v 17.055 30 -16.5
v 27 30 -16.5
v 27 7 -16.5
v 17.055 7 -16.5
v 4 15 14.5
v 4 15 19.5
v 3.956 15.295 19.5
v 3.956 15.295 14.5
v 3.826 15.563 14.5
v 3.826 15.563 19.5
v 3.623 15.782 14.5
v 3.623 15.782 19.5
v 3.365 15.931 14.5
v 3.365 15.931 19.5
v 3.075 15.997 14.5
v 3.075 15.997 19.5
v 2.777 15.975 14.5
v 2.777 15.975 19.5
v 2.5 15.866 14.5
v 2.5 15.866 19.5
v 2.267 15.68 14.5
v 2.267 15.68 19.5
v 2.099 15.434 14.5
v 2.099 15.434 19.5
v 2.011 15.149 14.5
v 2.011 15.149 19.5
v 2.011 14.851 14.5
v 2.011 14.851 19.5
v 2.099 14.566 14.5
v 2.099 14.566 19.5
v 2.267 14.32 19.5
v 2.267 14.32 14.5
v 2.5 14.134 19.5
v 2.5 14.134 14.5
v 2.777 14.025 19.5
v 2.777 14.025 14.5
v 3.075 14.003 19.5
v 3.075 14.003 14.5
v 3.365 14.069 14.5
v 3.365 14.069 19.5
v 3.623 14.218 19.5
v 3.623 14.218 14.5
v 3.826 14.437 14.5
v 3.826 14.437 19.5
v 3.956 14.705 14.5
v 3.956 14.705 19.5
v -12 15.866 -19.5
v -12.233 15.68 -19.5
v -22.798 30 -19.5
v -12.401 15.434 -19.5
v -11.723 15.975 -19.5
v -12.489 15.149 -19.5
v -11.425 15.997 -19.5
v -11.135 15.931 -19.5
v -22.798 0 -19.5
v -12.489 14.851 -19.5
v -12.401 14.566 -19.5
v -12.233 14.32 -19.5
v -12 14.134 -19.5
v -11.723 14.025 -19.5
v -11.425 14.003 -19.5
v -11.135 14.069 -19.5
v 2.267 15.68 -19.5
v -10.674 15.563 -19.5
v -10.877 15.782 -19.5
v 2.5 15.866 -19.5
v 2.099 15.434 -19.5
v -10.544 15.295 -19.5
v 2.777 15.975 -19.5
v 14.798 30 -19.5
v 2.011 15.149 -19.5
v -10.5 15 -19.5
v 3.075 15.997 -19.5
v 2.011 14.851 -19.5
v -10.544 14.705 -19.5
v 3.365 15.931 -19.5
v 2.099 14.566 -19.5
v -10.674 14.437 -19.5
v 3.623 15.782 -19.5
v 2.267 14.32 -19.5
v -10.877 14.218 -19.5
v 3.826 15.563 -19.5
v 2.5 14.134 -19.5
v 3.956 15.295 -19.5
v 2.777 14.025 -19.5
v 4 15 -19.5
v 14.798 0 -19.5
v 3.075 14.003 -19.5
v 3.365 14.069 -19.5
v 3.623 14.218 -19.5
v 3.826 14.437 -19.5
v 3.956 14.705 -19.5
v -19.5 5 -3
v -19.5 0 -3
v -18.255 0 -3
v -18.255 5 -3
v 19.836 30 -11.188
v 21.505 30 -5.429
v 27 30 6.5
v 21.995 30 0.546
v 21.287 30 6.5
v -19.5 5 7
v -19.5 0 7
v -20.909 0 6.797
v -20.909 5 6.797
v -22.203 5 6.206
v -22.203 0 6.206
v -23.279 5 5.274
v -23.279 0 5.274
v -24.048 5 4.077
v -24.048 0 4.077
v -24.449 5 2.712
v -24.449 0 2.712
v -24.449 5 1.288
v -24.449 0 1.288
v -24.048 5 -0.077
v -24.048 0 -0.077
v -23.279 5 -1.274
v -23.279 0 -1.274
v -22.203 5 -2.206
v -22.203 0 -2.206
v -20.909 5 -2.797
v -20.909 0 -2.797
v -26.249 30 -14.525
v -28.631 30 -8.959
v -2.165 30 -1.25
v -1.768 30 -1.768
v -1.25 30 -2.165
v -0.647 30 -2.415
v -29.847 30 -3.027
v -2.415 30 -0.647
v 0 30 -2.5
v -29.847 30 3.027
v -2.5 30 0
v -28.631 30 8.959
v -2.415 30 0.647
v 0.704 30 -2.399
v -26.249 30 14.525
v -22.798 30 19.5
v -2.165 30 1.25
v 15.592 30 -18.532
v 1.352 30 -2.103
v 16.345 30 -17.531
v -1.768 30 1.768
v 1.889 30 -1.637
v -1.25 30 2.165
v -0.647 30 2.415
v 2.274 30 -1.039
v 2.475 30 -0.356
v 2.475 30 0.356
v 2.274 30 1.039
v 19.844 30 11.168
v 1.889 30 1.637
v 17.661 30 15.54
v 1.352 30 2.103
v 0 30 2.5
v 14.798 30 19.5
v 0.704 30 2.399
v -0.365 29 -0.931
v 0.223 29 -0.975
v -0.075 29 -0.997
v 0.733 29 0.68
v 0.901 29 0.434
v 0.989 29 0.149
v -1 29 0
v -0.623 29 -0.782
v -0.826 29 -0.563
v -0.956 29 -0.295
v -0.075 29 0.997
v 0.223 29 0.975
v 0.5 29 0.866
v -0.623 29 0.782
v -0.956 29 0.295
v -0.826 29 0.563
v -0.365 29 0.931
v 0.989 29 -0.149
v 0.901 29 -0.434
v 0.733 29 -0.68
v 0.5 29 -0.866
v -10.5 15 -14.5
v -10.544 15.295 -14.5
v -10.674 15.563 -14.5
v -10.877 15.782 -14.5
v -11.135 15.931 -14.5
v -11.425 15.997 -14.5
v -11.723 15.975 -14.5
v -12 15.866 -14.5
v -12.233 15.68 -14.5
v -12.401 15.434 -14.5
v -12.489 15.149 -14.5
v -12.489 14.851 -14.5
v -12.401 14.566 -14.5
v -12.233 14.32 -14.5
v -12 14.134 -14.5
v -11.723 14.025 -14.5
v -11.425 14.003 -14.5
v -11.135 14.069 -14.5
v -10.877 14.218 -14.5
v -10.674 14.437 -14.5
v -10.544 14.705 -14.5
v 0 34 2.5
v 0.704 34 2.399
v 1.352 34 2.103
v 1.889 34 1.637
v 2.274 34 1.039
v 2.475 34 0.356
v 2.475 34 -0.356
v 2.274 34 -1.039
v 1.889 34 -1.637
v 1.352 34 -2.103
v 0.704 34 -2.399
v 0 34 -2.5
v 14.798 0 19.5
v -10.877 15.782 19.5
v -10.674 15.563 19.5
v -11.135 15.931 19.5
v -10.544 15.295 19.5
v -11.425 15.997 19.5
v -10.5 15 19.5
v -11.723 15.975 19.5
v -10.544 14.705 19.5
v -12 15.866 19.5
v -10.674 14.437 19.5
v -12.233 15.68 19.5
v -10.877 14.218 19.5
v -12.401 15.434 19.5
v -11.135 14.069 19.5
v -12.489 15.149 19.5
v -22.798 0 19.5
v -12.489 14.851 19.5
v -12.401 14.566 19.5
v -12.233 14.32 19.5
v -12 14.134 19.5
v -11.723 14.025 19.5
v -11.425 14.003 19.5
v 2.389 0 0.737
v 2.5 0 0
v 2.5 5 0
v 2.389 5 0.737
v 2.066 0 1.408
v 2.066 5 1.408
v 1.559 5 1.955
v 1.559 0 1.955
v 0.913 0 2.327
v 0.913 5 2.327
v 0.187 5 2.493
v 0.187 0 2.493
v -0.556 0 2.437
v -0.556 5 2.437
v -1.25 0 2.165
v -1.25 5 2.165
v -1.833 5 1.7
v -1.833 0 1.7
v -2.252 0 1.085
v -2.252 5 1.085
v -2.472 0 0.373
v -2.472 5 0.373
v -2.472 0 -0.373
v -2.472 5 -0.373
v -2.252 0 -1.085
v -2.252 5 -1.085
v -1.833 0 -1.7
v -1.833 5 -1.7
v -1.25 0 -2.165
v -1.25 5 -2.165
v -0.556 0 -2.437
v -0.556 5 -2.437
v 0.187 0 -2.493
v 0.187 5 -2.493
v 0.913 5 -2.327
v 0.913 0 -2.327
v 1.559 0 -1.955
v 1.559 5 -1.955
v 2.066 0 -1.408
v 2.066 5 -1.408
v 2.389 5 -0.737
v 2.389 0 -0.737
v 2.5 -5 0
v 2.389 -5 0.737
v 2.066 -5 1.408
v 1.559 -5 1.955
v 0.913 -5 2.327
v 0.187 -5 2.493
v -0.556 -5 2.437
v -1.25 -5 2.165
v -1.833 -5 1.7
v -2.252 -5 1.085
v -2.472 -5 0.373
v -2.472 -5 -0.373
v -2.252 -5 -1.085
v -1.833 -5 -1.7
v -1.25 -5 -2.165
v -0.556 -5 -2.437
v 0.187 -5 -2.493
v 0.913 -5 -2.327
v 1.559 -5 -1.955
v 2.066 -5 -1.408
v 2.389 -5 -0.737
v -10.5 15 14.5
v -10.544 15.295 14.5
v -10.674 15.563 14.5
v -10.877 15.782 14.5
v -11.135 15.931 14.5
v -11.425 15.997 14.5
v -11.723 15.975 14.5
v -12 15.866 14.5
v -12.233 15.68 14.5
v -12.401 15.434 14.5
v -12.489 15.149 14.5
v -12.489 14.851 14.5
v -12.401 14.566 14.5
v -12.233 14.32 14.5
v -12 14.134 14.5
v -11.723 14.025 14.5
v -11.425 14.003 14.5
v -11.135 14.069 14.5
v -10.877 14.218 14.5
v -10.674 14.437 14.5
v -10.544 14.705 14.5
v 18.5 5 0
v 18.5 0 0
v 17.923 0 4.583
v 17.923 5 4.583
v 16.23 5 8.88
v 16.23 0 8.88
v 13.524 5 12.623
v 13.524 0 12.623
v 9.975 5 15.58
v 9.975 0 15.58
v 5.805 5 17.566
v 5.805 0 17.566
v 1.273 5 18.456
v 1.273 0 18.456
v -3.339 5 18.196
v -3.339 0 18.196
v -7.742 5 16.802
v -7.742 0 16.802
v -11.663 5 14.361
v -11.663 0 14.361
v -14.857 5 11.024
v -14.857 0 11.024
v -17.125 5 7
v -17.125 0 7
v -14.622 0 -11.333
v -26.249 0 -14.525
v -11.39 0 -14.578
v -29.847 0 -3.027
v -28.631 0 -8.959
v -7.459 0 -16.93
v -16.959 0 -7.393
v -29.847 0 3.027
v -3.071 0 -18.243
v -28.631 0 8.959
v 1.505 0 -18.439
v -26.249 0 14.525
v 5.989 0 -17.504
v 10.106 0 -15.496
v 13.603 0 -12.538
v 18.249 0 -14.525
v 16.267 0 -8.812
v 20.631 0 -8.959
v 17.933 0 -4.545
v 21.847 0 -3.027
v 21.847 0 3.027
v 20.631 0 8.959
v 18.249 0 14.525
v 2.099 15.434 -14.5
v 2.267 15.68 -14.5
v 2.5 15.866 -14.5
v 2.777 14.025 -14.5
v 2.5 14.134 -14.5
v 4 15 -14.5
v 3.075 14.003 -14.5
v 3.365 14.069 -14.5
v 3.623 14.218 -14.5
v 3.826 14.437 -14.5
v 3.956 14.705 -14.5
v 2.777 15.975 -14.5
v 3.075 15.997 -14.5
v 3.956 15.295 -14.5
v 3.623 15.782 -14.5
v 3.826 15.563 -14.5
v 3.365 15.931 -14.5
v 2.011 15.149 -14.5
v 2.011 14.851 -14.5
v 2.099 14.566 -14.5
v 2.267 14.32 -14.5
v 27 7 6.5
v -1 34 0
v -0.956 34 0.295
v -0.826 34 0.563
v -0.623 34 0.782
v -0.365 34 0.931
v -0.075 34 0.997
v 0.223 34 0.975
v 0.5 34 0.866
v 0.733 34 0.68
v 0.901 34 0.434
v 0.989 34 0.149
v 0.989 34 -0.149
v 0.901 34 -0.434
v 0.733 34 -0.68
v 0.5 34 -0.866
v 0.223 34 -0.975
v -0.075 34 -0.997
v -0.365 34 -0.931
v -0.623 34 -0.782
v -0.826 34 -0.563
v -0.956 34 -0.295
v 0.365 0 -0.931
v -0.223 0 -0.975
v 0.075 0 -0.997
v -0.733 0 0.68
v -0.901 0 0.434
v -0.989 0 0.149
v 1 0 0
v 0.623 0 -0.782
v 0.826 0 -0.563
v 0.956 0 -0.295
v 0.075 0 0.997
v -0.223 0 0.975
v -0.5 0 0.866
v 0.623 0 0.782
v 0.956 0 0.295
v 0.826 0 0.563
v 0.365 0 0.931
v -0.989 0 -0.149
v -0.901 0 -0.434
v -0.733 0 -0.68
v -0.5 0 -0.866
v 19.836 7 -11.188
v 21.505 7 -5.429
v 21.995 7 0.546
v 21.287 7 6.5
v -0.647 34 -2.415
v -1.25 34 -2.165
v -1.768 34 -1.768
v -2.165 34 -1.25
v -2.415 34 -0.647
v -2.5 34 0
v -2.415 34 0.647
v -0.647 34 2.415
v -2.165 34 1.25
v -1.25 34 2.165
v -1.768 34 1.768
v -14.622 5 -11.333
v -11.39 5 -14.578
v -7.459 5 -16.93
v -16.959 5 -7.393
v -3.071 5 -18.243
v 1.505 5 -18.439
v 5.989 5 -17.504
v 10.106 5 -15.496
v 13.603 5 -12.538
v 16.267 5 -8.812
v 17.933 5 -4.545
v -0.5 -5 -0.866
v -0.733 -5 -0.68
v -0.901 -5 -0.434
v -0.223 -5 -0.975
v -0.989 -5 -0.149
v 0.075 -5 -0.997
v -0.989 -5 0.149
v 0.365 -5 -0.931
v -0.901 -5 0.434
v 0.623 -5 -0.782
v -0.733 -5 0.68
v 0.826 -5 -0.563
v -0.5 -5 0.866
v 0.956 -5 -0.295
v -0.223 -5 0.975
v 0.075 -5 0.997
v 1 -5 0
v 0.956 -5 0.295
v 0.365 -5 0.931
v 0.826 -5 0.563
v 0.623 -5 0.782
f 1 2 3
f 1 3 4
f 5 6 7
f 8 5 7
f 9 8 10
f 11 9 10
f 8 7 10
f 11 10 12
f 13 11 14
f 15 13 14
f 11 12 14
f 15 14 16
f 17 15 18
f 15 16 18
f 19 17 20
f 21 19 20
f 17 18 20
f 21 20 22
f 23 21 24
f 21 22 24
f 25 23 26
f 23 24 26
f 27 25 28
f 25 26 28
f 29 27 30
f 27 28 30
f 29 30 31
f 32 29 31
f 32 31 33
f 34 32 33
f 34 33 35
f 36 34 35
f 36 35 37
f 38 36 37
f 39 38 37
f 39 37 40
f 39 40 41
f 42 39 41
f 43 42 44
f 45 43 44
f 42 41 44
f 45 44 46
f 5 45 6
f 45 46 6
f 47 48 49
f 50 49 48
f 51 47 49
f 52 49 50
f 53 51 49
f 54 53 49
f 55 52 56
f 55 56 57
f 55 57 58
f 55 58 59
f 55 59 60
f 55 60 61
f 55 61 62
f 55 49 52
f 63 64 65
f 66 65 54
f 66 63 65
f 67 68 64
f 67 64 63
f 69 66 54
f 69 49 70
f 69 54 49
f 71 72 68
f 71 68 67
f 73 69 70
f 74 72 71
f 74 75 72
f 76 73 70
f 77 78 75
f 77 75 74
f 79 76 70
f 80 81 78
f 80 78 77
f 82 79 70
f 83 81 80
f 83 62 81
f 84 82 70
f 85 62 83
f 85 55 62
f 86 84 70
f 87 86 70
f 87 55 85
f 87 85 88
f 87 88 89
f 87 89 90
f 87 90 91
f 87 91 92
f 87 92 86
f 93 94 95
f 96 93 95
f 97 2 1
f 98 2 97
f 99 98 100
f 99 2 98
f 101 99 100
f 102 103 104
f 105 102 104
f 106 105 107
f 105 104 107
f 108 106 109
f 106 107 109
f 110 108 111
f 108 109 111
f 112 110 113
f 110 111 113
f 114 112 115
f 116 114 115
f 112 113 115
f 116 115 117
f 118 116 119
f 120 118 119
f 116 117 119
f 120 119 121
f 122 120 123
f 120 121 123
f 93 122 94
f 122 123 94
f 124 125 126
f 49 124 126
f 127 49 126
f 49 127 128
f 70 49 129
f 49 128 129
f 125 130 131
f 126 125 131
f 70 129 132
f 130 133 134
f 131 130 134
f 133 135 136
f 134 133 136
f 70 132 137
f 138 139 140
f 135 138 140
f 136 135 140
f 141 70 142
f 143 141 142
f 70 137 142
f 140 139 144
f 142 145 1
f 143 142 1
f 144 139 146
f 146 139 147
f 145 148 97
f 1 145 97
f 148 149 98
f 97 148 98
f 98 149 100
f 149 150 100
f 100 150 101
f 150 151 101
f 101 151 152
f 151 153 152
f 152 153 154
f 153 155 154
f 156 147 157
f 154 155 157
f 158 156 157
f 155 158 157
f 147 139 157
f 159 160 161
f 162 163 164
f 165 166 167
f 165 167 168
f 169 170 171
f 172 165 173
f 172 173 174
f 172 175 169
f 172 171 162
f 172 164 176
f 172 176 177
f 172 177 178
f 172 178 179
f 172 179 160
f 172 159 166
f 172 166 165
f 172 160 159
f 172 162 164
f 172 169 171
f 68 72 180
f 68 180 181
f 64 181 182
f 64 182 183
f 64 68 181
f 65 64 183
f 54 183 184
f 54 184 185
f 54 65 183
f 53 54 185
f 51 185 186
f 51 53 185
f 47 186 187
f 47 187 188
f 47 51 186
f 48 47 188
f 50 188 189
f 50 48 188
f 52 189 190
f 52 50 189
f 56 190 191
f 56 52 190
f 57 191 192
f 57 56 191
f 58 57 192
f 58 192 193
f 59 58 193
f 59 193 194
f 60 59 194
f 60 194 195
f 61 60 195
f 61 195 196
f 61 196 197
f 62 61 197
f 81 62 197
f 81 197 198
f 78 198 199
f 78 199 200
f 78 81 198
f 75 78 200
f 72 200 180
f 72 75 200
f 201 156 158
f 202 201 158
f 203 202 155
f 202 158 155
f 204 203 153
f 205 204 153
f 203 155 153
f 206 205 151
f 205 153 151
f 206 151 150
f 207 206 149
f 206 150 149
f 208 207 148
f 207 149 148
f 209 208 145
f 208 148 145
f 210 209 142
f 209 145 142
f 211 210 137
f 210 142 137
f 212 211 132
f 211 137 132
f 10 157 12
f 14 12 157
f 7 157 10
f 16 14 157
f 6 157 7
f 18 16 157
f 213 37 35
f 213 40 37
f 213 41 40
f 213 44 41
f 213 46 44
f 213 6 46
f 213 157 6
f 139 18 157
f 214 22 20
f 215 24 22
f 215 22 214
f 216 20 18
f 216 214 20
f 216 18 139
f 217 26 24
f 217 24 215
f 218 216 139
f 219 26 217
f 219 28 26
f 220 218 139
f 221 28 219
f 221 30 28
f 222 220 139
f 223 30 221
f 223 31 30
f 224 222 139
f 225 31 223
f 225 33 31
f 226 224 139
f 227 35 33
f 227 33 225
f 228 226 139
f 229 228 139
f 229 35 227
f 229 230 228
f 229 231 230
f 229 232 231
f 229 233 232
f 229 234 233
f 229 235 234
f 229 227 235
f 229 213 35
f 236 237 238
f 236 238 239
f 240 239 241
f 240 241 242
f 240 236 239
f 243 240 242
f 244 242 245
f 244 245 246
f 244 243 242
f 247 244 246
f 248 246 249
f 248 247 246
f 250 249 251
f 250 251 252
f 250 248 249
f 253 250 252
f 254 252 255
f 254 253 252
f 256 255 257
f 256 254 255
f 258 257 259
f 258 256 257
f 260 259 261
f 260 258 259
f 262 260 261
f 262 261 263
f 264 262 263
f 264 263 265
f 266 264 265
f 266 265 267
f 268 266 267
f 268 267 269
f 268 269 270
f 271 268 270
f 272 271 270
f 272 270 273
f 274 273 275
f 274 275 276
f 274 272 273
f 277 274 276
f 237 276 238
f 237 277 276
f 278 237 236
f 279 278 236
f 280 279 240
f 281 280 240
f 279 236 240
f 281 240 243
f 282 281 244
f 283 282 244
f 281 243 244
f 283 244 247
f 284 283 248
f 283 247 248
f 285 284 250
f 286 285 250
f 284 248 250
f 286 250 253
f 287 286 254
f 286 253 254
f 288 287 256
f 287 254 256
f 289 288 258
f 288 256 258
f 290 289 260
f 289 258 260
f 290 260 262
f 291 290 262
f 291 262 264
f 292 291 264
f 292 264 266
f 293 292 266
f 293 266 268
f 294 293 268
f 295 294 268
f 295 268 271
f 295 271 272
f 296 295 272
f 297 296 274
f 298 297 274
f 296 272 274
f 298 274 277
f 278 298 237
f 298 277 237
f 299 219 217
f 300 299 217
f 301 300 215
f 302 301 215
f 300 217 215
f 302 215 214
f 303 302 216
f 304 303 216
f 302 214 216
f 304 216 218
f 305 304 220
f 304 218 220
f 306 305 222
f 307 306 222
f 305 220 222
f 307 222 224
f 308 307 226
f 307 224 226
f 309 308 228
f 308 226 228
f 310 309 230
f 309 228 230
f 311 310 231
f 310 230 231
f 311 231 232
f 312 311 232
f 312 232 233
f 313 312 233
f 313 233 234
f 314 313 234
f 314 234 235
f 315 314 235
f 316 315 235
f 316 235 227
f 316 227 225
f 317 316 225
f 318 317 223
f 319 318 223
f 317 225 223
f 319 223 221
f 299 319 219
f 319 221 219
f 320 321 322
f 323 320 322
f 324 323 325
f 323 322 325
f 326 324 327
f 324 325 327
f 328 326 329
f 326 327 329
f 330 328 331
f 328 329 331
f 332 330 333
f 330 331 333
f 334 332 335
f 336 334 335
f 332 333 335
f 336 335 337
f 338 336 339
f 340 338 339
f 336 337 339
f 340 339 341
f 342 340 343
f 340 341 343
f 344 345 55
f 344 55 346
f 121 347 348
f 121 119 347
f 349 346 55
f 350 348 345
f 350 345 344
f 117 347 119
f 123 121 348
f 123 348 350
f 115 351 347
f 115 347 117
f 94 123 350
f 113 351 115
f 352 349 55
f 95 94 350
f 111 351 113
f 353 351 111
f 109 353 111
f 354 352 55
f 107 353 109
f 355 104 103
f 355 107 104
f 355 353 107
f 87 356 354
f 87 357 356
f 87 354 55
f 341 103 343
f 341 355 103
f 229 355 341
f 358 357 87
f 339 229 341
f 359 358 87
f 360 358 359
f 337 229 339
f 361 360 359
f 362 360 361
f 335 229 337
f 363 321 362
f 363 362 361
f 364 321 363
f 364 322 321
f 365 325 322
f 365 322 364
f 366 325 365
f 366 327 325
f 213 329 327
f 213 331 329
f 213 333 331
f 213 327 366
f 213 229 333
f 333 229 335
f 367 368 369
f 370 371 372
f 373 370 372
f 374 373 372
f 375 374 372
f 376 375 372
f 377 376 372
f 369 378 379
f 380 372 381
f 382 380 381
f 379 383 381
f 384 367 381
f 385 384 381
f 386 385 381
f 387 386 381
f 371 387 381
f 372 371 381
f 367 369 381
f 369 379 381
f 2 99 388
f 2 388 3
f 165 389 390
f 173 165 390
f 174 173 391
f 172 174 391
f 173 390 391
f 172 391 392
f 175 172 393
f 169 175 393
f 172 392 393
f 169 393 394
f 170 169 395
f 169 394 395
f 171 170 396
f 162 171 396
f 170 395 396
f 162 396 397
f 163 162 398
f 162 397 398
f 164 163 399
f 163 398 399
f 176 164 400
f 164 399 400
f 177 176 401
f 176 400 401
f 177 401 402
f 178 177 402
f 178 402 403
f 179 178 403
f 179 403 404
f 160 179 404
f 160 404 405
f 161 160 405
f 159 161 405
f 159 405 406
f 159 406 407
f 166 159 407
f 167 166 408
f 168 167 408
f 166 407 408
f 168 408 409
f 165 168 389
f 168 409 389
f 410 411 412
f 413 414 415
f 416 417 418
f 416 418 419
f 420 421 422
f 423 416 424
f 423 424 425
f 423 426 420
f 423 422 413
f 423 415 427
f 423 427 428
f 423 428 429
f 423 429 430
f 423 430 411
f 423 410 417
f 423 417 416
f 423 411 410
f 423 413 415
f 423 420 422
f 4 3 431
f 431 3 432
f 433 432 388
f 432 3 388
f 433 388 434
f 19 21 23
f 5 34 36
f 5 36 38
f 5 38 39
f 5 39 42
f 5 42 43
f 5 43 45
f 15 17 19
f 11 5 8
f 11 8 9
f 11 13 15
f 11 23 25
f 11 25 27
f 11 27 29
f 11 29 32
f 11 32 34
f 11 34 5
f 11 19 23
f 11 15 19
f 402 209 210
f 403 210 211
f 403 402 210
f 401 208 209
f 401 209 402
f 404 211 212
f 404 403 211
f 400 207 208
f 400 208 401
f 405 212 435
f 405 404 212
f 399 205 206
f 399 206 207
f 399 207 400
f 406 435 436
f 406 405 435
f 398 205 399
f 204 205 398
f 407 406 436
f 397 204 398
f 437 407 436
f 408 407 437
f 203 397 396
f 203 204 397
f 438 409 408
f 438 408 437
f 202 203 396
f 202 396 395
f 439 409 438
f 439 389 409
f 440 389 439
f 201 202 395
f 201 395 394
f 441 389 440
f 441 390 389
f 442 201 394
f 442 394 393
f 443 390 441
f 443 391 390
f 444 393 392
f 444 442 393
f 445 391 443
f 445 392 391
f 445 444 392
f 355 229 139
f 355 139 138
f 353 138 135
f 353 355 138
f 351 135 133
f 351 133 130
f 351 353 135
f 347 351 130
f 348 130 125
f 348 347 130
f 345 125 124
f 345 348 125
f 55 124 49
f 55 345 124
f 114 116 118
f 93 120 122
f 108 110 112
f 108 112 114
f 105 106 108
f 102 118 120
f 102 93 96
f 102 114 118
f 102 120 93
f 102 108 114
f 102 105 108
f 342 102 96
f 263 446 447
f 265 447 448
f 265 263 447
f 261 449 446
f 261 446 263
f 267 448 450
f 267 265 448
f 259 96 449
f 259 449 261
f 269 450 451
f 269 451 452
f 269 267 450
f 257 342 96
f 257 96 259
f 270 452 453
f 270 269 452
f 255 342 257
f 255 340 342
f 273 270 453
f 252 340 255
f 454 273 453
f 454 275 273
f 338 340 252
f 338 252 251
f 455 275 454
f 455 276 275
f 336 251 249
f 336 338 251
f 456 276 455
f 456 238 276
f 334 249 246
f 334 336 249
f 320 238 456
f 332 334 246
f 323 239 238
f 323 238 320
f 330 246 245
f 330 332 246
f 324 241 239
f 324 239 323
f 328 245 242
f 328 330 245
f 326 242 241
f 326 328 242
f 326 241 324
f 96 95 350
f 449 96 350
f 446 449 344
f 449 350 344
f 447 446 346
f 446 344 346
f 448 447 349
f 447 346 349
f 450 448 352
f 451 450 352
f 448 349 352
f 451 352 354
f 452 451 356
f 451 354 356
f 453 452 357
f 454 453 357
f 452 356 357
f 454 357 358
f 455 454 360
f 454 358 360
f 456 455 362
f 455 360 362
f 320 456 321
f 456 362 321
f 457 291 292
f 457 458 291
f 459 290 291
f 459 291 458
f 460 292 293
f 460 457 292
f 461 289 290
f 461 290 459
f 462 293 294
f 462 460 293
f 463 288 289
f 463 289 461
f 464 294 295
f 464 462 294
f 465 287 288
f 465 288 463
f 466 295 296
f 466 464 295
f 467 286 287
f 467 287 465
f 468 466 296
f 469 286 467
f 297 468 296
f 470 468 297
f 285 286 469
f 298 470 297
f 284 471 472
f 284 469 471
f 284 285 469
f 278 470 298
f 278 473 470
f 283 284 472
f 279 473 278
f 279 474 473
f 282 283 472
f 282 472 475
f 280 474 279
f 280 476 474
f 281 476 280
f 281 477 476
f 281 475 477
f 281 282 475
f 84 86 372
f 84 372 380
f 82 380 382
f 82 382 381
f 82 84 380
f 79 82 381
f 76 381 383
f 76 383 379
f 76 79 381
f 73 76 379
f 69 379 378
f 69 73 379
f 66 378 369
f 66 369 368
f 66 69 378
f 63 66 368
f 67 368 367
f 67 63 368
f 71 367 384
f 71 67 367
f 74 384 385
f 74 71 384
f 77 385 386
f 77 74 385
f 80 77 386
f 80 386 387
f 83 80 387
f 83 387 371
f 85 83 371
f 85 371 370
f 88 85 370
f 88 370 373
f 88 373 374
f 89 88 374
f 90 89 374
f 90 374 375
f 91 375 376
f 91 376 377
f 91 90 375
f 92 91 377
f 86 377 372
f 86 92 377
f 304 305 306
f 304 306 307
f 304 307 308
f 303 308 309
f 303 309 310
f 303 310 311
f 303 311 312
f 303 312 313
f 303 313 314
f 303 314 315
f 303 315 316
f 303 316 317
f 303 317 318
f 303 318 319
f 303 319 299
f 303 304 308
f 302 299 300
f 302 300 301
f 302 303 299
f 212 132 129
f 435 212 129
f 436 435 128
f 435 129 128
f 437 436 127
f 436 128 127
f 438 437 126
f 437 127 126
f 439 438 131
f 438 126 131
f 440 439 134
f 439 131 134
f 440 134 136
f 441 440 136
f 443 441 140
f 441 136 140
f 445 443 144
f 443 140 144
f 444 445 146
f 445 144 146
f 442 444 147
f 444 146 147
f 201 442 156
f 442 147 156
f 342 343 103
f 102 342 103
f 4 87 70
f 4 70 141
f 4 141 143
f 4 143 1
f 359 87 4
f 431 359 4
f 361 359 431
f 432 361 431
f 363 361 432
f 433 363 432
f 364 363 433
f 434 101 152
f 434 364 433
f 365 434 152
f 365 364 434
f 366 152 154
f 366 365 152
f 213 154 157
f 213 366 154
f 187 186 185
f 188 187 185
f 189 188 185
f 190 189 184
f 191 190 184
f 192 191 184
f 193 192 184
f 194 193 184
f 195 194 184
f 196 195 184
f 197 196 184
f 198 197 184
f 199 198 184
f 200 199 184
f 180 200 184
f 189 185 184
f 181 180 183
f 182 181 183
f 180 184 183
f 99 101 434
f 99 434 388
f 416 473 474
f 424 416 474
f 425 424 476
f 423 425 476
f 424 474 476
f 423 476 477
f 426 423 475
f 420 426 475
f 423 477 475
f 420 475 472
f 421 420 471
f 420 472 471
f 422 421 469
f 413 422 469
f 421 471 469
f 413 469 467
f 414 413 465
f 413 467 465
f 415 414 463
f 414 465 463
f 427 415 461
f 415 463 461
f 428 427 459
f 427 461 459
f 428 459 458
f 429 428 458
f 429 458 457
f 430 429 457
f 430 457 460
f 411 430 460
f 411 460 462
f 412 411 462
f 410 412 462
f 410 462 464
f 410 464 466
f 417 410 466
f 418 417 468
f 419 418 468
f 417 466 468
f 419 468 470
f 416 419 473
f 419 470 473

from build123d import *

# Parameters (mm, degrees)
F0_R      = 2.5
F1_DEPTH  = 30
F2_DEPTH  = 5
F3_DEPTH  = 5
F4_R      = 1
F5_DEPTH  = 5
F7_DEPTH  = 23
F8_DEPTH  = 4
F9_R      = 1
F10_DEPTH = 5
F11_R     = 1
F12_DEPTH = 5


# Not quite as in the source:
# - a pattern or mirror of a feature is missing from the dataset's text; its kind, count and spacing are read off the source's solid


with BuildPart() as f1:
    # F0 (on Front) → F1 (new body)
    with BuildSketch(Plane.XZ):
        with BuildLine():
            Line((14.7980262304, 19.5), (-22.7980262304, 19.5))
            ThreePointArc((-22.7980262304, 19.5), (-30, 0), (-22.7980262304, -19.5))
            Line((-22.7980262304, -19.5), (14.7980262304, -19.5))
            ThreePointArc((14.7980262304, -19.5), (22, 0), (14.7980262304, 19.5))
        make_face()
        with BuildLine():
            ThreePointArc((-17.1245437895, 7), (3.5669272416, 18.1528793874), (18.5, 0))
            ThreePointArc((18.5, 0), (1.5049882267, -18.4386824485), (-18.2551362635, -3))
            Line((-18.2551362635, -3), (-19.5, -3))
            ThreePointArc((-19.5, -3), (-24.5, 2), (-19.5, 7))
            Line((-19.5, 7), (-17.1245437895, 7))
        make_face(mode=Mode.SUBTRACT)
        with BuildLine():
            ThreePointArc((-18.2551362635, -3), (1.5049882267, -18.4386824485), (18.5, 0))
            ThreePointArc((18.5, 0), (3.5669272416, 18.1528793874), (-17.1245437895, 7))
            ThreePointArc((-17.1245437895, 7), (-17.2243437117, 6.7507024597), (-17.320514605, 6.4999826014))
            ThreePointArc((-17.320514605, 6.4999826014), (-15.2634077978, 4.6554258627), (-14.5, 2))
            ThreePointArc((-14.5, 2), (-15.5564468025, -1.0738230558), (-18.2793552714, -2.8487138961))
            ThreePointArc((-18.2793552714, -2.8487138961), (-18.2674023824, -2.9243820202), (-18.2551362635, -3))
        make_face()
        Circle(F0_R, mode=Mode.SUBTRACT)
        with BuildLine():
            ThreePointArc((-18.2793552714, -2.8487138961), (-18.4034566143, 1.8875340117), (-17.320514605, 6.4999826014))
            ThreePointArc((-17.320514605, 6.4999826014), (-18.3819465592, 6.8733927098), (-19.5, 7))
            ThreePointArc((-19.5, 7), (-24.5, 2), (-19.5, -3))
            ThreePointArc((-19.5, -3), (-18.885007919, -2.9620343349), (-18.2793552714, -2.8487138961))
        make_face()
        with BuildLine():
            ThreePointArc((-14.5, 2), (-15.2634077978, 4.6554258627), (-17.320514605, 6.4999826014))
            ThreePointArc((-17.320514605, 6.4999826014), (-18.4034566143, 1.8875340117), (-18.2793552714, -2.8487138961))
            ThreePointArc((-18.2793552714, -2.8487138961), (-15.5564468025, -1.0738230558), (-14.5, 2))
        make_face()
        with BuildLine():
            ThreePointArc((-17.320514605, 6.4999826014), (-17.2243437117, 6.7507024597), (-17.1245437895, 7))
            Line((-17.1245437895, 7), (-19.5, 7))
            ThreePointArc((-19.5, 7), (-18.3819465592, 6.8733927098), (-17.320514605, 6.4999826014))
        make_face()
        with BuildLine():
            Line((-19.5, -3), (-18.2551362635, -3))
            ThreePointArc((-18.2551362635, -3), (-18.2674023824, -2.9243820202), (-18.2793552714, -2.8487138961))
            ThreePointArc((-18.2793552714, -2.8487138961), (-18.885007919, -2.9620343349), (-19.5, -3))
        make_face()
        Circle(F0_R)
    extrude(amount=-F1_DEPTH)

    # F0 (on Front) → F2 (cut)
    with BuildSketch(Plane.XZ):
        with BuildLine():
            ThreePointArc((-18.2551362635, -3), (1.5049882267, -18.4386824485), (18.5, 0))
            ThreePointArc((18.5, 0), (3.5669272416, 18.1528793874), (-17.1245437895, 7))
            ThreePointArc((-17.1245437895, 7), (-17.2243437117, 6.7507024597), (-17.320514605, 6.4999826014))
            ThreePointArc((-17.320514605, 6.4999826014), (-15.2634077978, 4.6554258627), (-14.5, 2))
            ThreePointArc((-14.5, 2), (-15.5564468025, -1.0738230558), (-18.2793552714, -2.8487138961))
            ThreePointArc((-18.2793552714, -2.8487138961), (-18.2674023824, -2.9243820202), (-18.2551362635, -3))
        make_face()
        Circle(F0_R, mode=Mode.SUBTRACT)
        with BuildLine():
            ThreePointArc((-17.320514605, 6.4999826014), (-17.2243437117, 6.7507024597), (-17.1245437895, 7))
            Line((-17.1245437895, 7), (-19.5, 7))
            ThreePointArc((-19.5, 7), (-18.3819465592, 6.8733927098), (-17.320514605, 6.4999826014))
        make_face()
        with BuildLine():
            Line((-19.5, -3), (-18.2551362635, -3))
            ThreePointArc((-18.2551362635, -3), (-18.2674023824, -2.9243820202), (-18.2793552714, -2.8487138961))
            ThreePointArc((-18.2793552714, -2.8487138961), (-18.885007919, -2.9620343349), (-19.5, -3))
        make_face()
        with BuildLine():
            ThreePointArc((-18.2793552714, -2.8487138961), (-18.4034566143, 1.8875340117), (-17.320514605, 6.4999826014))
            ThreePointArc((-17.320514605, 6.4999826014), (-18.3819465592, 6.8733927098), (-19.5, 7))
            ThreePointArc((-19.5, 7), (-24.5, 2), (-19.5, -3))
            ThreePointArc((-19.5, -3), (-18.885007919, -2.9620343349), (-18.2793552714, -2.8487138961))
        make_face()
        with BuildLine():
            ThreePointArc((-14.5, 2), (-15.2634077978, 4.6554258627), (-17.320514605, 6.4999826014))
            ThreePointArc((-17.320514605, 6.4999826014), (-18.4034566143, 1.8875340117), (-18.2793552714, -2.8487138961))
            ThreePointArc((-18.2793552714, -2.8487138961), (-15.5564468025, -1.0738230558), (-14.5, 2))
        make_face()
    extrude(amount=-F2_DEPTH, mode=Mode.SUBTRACT)

    # F0 (on Front) → F3 (join)
    with BuildSketch(Plane.XZ):
        Circle(F0_R)
    extrude(amount=F3_DEPTH)

    # F4 (on face) → F5 (cut)
    with BuildSketch(Plane.XY.offset(19.5)):
        with Locations((-11.5, 15)):
            Circle(F4_R)
        with Locations((3, 15)):
            Circle(F4_R)
    f5 = extrude(amount=-F5_DEPTH, mode=Mode.SUBTRACT)

    # F5_copies: F5 across plane
    add(f5.mirror(Plane(origin=(0, 0, 0), x_dir=(-1, 0, 0), z_dir=(0, 0, -1))), mode=Mode.SUBTRACT)

    # F6 (on face) → F7 (join)
    with BuildSketch(Plane(origin=(0, 30, 0), x_dir=(-1, 0, 0), z_dir=(0, 1, 0))):
        with BuildLine():
            Line((-27, -16.5), (-17.0549396327, -16.5))
            ThreePointArc((-17.0549396327, -16.5), (-21.5046036204, -5.4293982359), (-21.2873692912, 6.5))
            Line((-21.2873692912, 6.5), (-27, 6.5))
            Line((-27, 6.5), (-27, -16.5))
        make_face()
    extrude(amount=-F7_DEPTH)

    # F6 (on face) → F8 (join)
    with BuildSketch(Plane(origin=(0, 30, 0), x_dir=(-1, 0, 0), z_dir=(0, 1, 0))):
        with BuildLine():
            ThreePointArc((0, 2.5), (-2.5, 0), (0, -2.5))
            Line((0, -2.5), (0, 2.5))
        make_face()
        with BuildLine():
            Line((0, 2.5), (0, -2.5))
            ThreePointArc((0, -2.5), (1.767766953, -1.767766953), (2.5, 0))
            ThreePointArc((2.5, 0), (1.767766953, 1.767766953), (0, 2.5))
        make_face()
    extrude(amount=F8_DEPTH)

    # F9 (on face) → F10 (cut)
    with BuildSketch(Plane.XZ.offset(5)):
        Circle(F9_R)
    extrude(amount=-F10_DEPTH, mode=Mode.SUBTRACT)

    # F11 (on face) → F12 (cut)
    with BuildSketch(Plane(origin=(0, 34, 0), x_dir=(-1, 0, 0), z_dir=(0, 1, 0))):
        Circle(F11_R)
    extrude(amount=-F12_DEPTH, mode=Mode.SUBTRACT)


solid = f1.part
